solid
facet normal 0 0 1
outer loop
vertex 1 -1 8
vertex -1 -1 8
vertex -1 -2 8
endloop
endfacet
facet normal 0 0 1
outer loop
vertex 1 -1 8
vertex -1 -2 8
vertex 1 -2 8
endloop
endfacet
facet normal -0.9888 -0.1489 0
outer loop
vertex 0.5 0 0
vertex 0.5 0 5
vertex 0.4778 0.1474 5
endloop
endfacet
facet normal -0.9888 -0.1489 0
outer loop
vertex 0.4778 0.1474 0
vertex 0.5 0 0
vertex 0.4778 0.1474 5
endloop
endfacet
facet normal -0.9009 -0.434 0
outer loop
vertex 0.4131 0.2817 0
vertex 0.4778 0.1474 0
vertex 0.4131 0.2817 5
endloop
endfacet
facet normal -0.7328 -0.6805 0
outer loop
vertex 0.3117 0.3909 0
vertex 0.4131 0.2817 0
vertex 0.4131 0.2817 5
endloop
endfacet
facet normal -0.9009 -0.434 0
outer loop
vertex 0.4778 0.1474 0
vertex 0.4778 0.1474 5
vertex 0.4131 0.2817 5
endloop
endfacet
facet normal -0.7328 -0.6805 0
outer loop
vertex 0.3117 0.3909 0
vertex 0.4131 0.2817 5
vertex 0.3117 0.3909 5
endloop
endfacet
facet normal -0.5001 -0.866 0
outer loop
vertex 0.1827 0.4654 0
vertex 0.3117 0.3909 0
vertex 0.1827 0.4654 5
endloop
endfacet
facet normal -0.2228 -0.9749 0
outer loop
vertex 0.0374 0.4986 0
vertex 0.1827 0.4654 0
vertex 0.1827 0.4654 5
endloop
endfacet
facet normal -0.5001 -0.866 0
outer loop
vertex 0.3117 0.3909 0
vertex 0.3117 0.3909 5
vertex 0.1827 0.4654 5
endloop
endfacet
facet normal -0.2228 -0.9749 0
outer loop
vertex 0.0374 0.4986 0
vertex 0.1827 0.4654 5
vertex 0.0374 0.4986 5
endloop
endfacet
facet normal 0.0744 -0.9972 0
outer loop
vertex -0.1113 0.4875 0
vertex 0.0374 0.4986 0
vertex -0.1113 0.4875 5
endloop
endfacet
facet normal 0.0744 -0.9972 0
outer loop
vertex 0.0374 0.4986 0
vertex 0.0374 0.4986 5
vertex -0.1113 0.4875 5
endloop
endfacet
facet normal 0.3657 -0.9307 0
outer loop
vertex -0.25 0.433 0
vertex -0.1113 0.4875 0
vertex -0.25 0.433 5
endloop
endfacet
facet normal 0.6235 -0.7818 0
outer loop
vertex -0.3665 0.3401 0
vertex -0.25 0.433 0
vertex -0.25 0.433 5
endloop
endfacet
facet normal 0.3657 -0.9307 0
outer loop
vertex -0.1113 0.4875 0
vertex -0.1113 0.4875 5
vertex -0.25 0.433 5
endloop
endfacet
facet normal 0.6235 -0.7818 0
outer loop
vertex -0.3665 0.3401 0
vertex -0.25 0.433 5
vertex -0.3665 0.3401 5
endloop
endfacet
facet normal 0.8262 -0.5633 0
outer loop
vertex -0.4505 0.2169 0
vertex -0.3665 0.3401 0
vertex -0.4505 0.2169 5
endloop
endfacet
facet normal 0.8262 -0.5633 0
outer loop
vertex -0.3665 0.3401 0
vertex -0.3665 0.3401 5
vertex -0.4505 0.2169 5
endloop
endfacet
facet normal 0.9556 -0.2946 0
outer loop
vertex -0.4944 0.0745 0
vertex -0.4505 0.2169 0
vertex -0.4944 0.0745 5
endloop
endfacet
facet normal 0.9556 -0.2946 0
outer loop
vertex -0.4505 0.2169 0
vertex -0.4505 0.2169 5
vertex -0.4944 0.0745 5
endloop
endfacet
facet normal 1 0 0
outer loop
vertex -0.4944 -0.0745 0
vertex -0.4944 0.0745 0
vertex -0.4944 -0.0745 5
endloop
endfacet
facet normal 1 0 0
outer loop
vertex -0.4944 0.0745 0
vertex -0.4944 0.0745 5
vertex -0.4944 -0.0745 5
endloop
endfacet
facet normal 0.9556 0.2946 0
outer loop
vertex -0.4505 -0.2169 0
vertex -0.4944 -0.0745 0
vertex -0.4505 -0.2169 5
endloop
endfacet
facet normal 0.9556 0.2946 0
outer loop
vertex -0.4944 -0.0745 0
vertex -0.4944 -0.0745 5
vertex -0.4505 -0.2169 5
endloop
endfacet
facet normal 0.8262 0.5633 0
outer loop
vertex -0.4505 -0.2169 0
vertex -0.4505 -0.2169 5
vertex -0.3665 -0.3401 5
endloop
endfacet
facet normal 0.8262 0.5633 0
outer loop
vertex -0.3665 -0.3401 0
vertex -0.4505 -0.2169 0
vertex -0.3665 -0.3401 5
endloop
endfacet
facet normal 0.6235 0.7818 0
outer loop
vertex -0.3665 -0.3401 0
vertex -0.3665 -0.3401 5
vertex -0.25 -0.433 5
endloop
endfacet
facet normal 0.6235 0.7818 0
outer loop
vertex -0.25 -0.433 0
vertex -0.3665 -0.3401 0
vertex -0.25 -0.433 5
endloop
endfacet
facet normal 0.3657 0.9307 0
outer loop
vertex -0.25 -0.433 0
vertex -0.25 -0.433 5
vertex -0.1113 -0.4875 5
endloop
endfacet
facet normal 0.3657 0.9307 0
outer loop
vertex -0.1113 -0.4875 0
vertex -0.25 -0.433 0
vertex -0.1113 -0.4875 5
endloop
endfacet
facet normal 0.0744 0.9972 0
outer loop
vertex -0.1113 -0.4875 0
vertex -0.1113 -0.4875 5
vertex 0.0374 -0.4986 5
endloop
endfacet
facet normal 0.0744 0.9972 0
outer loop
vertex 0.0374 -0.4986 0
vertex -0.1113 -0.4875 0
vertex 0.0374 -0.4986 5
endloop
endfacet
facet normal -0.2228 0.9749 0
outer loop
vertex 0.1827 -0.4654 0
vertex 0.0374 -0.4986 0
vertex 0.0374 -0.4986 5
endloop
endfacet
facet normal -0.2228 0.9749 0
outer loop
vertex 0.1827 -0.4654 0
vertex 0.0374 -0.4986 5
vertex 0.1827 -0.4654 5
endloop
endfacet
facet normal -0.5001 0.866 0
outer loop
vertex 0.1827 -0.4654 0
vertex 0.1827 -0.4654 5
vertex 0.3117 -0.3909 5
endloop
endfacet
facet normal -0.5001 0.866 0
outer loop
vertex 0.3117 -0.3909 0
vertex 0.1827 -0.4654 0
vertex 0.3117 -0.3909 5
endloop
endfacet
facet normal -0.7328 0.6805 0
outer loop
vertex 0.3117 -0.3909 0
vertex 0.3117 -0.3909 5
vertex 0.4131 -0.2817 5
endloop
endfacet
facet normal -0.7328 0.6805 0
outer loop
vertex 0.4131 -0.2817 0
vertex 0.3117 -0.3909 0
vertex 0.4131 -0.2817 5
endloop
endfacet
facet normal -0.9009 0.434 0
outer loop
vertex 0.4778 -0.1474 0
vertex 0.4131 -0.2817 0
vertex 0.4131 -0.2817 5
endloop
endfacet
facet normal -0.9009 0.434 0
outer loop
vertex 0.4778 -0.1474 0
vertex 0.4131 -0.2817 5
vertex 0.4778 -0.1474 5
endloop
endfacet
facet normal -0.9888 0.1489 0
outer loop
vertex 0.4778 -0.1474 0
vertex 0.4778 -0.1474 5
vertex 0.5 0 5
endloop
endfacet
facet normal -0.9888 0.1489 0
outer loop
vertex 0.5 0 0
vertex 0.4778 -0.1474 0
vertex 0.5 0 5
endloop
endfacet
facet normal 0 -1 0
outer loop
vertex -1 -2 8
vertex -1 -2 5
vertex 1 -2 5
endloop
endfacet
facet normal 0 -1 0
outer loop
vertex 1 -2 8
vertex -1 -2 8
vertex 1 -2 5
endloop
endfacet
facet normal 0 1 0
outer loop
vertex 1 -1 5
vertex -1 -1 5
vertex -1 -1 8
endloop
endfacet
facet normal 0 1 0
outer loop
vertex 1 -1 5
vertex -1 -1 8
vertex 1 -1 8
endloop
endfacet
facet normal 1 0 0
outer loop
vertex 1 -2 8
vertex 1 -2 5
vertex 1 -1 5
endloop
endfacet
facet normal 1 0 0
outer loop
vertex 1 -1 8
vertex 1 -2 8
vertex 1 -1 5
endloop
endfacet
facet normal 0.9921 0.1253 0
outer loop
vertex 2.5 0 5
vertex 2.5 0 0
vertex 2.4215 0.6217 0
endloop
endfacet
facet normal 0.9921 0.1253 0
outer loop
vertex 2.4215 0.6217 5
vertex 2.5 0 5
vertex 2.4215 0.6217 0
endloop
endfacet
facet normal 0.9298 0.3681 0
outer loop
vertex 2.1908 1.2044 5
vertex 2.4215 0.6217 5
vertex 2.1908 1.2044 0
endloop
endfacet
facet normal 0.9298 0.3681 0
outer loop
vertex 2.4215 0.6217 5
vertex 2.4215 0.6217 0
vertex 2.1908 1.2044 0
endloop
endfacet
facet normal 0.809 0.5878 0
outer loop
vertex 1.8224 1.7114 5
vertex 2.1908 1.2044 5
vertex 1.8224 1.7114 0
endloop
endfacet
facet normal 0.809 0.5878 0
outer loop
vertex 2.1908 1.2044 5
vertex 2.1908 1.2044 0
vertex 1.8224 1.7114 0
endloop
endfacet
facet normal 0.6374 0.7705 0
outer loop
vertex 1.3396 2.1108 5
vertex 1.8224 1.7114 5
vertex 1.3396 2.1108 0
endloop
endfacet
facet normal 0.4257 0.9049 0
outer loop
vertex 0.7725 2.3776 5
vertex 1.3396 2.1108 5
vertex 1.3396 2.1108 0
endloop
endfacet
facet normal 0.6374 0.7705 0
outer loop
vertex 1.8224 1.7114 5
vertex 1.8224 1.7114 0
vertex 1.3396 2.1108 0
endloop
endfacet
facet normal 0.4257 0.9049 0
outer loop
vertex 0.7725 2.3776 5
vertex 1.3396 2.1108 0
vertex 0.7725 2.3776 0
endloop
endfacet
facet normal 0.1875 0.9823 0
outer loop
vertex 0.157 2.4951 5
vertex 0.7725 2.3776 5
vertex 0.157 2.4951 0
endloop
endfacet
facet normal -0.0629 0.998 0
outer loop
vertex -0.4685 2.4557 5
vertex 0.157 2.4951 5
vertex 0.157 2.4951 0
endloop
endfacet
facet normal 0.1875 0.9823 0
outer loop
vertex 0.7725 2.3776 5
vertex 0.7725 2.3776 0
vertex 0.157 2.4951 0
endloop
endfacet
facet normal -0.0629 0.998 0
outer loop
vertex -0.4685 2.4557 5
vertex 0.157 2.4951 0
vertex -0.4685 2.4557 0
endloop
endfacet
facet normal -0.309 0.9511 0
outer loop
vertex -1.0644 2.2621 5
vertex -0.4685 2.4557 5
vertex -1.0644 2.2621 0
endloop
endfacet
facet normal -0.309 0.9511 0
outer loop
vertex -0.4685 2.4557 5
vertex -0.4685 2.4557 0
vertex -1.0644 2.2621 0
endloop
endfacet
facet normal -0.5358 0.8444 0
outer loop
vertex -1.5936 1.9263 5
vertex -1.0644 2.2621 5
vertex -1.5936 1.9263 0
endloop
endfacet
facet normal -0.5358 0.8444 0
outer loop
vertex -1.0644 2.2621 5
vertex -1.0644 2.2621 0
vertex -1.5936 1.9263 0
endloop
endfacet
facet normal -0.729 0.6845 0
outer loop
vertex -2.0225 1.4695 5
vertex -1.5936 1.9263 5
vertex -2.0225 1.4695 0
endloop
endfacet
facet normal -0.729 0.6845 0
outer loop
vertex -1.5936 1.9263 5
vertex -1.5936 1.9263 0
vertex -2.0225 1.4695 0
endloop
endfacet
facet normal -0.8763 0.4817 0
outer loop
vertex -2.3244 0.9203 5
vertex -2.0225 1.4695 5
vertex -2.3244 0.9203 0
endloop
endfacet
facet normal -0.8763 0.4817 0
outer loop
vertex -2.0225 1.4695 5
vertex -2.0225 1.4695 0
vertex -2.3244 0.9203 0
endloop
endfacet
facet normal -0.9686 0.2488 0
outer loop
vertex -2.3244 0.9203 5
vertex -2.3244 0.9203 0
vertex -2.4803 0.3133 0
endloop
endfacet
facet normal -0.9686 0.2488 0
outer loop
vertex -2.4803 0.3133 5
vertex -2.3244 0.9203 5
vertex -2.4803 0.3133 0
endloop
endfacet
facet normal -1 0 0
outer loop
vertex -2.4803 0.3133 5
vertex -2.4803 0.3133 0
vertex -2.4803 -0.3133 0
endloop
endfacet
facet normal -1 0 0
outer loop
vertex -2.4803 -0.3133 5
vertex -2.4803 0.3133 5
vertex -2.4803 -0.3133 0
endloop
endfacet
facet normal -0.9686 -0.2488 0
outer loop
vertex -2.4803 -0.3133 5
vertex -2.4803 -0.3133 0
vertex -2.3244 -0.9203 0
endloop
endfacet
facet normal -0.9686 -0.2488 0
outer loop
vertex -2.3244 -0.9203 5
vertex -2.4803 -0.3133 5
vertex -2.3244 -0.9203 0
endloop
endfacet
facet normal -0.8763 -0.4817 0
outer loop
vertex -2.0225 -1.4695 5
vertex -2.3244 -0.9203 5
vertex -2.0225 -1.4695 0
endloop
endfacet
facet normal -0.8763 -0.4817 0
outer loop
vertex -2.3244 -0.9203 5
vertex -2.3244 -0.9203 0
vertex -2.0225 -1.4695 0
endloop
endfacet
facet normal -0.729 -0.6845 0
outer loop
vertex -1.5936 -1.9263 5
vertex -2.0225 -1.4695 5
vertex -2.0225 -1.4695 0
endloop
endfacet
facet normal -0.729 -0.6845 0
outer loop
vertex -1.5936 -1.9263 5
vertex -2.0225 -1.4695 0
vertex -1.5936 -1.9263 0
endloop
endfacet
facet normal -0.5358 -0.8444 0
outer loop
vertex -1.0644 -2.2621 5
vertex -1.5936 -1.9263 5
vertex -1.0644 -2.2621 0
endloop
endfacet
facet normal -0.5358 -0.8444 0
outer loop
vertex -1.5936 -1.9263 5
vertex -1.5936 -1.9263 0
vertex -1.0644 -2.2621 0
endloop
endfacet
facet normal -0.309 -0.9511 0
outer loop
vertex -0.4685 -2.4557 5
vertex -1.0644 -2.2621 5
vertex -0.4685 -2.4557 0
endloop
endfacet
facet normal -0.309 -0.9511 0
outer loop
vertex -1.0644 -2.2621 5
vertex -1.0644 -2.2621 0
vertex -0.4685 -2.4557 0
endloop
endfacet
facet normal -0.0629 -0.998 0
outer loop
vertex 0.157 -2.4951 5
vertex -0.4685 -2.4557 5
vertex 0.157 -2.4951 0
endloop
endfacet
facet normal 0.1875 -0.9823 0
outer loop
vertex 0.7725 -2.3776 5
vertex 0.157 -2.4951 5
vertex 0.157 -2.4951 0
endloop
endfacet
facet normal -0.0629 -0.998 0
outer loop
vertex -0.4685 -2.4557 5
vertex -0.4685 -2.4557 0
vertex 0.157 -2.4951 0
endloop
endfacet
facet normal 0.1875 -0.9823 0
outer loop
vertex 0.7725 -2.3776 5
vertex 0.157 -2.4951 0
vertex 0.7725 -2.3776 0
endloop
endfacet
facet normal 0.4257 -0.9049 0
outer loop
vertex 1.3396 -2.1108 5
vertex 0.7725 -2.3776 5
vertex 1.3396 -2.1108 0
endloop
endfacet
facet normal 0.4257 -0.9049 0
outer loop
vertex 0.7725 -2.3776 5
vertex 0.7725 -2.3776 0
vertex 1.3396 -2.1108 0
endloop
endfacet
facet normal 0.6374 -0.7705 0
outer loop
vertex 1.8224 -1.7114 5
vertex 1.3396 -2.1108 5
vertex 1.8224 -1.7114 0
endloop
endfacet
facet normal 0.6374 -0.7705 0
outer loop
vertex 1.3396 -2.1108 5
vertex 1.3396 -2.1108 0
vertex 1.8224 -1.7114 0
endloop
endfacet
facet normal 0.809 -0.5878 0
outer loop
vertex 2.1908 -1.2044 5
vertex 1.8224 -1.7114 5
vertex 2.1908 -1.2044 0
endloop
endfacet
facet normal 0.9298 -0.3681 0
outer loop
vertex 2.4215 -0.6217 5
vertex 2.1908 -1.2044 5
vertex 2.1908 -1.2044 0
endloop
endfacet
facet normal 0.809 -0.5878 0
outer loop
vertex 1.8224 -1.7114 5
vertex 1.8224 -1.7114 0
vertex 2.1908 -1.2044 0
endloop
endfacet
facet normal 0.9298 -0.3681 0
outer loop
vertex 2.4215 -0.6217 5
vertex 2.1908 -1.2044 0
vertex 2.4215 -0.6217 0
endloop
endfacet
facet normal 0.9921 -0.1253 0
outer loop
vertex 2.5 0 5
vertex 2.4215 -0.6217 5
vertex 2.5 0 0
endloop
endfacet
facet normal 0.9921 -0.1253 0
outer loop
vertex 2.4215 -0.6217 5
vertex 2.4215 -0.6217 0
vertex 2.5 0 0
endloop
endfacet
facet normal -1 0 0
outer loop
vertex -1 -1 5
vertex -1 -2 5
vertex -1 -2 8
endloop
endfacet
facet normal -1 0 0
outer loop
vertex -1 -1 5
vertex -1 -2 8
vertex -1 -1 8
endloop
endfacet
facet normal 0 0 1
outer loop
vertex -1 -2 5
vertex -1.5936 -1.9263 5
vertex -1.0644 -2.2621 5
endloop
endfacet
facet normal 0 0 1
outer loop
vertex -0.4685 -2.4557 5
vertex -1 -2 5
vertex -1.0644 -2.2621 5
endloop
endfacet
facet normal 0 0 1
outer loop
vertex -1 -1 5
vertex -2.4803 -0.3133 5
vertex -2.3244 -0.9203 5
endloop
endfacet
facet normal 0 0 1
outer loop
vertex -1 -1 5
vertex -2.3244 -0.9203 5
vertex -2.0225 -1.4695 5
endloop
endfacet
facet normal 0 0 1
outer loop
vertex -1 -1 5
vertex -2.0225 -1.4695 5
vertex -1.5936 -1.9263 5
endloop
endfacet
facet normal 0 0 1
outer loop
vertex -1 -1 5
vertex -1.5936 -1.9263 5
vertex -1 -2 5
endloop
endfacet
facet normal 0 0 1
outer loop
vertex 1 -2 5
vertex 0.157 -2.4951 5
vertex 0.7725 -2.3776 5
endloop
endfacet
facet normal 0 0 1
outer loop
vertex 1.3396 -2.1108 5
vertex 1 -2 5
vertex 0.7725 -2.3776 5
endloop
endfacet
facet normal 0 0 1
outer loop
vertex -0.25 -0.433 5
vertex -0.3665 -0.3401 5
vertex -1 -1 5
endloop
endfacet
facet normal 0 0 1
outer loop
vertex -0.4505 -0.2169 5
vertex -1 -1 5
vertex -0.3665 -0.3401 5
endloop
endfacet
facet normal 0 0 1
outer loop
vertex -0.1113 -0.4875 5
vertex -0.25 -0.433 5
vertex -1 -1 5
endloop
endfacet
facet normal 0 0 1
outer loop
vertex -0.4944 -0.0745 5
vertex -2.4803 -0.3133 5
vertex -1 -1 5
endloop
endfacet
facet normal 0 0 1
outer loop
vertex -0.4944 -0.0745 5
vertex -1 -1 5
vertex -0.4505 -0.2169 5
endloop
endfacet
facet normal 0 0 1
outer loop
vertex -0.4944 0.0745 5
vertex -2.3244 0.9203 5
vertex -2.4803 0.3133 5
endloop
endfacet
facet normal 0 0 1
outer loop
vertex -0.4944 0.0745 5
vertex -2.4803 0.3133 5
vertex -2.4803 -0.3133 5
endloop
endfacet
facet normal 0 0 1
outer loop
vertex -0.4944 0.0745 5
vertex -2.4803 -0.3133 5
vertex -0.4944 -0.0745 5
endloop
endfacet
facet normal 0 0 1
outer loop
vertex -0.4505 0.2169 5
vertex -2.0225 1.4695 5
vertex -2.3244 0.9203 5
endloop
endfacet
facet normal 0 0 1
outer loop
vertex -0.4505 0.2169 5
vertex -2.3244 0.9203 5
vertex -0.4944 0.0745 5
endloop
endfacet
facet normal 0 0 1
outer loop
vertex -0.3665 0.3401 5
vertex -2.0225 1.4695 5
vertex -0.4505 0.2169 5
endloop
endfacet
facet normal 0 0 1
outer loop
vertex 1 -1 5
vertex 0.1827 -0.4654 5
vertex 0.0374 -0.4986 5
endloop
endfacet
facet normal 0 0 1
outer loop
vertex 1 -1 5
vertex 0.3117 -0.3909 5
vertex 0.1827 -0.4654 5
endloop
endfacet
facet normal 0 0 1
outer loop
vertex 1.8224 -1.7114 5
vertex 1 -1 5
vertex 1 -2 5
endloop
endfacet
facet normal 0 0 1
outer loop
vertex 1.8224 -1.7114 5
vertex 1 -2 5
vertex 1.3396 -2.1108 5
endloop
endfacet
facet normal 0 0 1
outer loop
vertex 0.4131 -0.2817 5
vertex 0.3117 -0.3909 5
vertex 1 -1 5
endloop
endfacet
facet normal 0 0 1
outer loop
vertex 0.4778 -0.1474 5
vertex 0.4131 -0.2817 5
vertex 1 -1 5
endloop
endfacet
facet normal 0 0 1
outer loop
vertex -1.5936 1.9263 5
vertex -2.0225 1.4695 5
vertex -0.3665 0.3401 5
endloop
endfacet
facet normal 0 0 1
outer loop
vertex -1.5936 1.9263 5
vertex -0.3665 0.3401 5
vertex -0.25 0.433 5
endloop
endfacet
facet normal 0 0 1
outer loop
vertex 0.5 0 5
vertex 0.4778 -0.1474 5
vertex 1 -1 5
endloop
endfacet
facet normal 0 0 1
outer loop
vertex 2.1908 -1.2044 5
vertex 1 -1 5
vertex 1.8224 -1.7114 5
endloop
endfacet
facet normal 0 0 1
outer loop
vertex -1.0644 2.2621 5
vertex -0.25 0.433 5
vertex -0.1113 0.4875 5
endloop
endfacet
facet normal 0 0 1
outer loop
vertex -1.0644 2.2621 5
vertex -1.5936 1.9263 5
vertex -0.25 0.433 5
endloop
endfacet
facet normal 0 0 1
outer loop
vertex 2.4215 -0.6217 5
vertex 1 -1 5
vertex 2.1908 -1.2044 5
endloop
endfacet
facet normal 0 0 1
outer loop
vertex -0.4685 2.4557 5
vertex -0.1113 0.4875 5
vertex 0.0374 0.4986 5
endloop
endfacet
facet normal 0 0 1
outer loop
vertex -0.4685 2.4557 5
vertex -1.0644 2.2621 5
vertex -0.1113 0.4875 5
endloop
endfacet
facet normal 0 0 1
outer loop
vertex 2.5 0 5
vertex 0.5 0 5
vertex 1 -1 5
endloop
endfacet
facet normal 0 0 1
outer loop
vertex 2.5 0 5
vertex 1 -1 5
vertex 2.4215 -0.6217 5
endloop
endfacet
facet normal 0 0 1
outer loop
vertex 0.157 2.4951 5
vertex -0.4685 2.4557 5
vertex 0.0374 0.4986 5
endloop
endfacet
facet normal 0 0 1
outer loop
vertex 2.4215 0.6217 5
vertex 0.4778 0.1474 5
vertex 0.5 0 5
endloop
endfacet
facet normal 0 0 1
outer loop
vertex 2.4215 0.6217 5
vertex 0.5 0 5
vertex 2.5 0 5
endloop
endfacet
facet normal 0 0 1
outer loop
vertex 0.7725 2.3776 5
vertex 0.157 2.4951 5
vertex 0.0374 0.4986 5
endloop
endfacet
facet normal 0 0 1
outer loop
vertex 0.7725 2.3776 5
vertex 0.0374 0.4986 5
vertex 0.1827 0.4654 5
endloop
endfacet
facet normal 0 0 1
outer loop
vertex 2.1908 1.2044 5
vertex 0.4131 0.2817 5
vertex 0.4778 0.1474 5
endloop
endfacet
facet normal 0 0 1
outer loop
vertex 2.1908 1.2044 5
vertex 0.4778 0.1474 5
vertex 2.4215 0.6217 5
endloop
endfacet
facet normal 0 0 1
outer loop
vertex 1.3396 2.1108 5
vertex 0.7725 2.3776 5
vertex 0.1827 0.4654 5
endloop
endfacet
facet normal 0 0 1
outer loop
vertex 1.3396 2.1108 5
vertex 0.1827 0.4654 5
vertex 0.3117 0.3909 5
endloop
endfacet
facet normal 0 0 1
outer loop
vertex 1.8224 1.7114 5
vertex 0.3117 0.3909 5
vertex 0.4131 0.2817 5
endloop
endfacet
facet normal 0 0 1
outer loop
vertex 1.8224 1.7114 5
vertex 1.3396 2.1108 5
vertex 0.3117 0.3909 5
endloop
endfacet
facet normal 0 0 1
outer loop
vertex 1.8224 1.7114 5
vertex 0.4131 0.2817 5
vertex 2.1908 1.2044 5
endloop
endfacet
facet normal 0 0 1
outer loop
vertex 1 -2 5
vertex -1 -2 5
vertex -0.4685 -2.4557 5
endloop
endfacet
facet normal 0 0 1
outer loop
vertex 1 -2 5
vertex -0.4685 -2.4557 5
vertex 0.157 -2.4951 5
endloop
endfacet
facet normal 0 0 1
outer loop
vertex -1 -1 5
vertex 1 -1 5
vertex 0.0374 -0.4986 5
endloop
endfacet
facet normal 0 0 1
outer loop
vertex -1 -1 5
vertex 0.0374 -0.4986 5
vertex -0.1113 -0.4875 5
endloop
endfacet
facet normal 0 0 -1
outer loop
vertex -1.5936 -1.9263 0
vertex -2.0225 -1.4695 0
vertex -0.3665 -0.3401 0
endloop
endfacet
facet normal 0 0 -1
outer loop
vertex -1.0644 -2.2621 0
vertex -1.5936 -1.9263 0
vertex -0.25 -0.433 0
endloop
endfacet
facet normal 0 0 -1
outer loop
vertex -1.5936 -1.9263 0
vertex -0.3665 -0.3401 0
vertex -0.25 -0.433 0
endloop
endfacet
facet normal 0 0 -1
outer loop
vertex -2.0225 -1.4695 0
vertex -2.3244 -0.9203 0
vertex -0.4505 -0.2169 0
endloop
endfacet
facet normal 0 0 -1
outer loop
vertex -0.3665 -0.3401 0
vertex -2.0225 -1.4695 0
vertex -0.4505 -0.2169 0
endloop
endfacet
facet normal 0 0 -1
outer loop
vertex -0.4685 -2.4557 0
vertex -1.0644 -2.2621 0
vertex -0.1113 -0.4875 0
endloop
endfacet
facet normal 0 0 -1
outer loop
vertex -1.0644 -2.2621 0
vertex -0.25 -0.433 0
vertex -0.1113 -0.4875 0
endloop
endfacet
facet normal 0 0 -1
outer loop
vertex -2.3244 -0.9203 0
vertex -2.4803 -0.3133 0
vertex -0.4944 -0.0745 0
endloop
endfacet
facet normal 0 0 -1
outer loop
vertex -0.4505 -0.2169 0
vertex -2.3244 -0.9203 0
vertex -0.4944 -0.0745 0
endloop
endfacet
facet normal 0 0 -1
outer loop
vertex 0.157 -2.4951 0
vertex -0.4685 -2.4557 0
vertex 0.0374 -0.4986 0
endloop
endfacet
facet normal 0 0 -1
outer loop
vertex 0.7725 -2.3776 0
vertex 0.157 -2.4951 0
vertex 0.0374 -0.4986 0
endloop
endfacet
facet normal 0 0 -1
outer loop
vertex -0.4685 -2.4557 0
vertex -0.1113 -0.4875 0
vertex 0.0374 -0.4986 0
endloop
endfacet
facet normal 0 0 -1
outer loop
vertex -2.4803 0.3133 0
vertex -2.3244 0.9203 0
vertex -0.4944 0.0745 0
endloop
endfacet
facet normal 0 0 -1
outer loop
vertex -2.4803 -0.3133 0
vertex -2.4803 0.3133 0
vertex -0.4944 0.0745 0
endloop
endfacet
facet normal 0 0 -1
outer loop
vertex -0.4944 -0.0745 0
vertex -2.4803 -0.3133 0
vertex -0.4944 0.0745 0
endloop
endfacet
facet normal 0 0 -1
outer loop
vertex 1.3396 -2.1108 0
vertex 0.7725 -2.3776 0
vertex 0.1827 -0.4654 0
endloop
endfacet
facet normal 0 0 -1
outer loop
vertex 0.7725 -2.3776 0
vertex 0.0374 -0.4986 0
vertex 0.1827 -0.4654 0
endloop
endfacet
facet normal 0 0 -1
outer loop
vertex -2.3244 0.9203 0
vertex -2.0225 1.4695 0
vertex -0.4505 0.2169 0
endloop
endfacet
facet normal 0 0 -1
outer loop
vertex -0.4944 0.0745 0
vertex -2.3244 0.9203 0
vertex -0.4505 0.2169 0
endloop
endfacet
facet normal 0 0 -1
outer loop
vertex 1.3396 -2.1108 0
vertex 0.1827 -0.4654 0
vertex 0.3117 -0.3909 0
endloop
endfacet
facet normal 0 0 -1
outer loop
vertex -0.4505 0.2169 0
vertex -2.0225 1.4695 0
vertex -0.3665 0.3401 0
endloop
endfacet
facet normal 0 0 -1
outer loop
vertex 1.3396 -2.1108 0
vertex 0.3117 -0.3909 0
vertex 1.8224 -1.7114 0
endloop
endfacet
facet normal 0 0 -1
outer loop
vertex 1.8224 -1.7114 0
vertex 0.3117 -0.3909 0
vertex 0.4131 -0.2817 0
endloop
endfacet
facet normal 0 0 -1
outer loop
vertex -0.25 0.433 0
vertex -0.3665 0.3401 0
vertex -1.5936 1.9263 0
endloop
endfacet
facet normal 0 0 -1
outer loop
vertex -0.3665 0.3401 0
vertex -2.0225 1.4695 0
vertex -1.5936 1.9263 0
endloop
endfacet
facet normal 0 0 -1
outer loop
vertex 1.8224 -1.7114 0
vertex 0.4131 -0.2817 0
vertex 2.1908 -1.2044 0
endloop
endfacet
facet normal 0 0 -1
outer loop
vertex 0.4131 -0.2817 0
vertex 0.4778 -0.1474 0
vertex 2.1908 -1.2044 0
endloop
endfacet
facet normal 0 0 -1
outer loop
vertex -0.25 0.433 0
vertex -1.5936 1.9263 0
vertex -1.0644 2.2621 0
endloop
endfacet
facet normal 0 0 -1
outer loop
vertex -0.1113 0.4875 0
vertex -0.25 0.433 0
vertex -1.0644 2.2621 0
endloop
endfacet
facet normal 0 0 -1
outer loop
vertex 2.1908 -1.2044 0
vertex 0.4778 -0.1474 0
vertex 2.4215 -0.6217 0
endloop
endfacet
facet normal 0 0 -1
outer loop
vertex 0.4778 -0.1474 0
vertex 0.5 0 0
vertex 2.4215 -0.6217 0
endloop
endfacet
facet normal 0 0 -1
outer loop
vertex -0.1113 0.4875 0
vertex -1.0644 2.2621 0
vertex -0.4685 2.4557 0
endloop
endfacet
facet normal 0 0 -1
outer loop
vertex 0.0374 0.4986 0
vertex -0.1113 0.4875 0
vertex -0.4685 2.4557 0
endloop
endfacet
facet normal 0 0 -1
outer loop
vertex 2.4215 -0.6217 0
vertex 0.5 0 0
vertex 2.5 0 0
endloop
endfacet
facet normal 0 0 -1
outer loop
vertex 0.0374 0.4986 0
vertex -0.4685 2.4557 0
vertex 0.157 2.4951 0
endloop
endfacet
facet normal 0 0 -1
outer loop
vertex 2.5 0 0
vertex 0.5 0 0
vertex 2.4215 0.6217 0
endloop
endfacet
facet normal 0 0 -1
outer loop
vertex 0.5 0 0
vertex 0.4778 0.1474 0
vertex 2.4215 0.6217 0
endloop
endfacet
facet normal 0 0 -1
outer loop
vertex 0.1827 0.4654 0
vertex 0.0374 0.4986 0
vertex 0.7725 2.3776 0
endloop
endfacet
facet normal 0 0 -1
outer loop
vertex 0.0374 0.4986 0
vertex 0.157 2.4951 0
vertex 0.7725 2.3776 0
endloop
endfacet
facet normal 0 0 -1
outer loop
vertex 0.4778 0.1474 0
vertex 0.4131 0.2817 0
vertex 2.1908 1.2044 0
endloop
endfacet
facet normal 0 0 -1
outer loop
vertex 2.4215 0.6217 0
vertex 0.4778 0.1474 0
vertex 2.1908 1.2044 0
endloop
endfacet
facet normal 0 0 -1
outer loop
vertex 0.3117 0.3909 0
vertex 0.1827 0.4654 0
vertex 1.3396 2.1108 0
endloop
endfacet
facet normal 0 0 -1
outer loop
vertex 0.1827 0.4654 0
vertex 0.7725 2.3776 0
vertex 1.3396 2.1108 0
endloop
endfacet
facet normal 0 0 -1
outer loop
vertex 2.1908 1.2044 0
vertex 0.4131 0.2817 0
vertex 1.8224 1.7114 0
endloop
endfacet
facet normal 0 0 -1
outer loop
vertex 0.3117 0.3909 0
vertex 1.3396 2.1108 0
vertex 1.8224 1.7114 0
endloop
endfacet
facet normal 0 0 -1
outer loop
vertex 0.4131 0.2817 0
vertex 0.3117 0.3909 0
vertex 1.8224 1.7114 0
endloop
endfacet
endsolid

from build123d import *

# Parameters (mm, degrees)
F0_R     = 2.5
F1_DEPTH = 5
F2_W     = 2
F2_H     = 1
F3_DEPTH = 3
F4_R     = 0.5
F5_DEPTH = 25


with BuildPart() as f1:
    # F0 (on Top) → F1 (new body)
    with BuildSketch(Plane.XY):
        Circle(F0_R)
    extrude(amount=F1_DEPTH)

    # F2 (on face) → F3 (join)
    with BuildSketch(Plane.XY.offset(5)):
        with Locations((0, -1.5)):
            Rectangle(F2_W, F2_H)
    extrude(amount=F3_DEPTH)

    # F4 (on face) → F5 (cut)
    with BuildSketch(Plane.XY.offset(5)):
        Circle(F4_R)
    extrude(amount=-F5_DEPTH, mode=Mode.SUBTRACT)


solid = f1.part
